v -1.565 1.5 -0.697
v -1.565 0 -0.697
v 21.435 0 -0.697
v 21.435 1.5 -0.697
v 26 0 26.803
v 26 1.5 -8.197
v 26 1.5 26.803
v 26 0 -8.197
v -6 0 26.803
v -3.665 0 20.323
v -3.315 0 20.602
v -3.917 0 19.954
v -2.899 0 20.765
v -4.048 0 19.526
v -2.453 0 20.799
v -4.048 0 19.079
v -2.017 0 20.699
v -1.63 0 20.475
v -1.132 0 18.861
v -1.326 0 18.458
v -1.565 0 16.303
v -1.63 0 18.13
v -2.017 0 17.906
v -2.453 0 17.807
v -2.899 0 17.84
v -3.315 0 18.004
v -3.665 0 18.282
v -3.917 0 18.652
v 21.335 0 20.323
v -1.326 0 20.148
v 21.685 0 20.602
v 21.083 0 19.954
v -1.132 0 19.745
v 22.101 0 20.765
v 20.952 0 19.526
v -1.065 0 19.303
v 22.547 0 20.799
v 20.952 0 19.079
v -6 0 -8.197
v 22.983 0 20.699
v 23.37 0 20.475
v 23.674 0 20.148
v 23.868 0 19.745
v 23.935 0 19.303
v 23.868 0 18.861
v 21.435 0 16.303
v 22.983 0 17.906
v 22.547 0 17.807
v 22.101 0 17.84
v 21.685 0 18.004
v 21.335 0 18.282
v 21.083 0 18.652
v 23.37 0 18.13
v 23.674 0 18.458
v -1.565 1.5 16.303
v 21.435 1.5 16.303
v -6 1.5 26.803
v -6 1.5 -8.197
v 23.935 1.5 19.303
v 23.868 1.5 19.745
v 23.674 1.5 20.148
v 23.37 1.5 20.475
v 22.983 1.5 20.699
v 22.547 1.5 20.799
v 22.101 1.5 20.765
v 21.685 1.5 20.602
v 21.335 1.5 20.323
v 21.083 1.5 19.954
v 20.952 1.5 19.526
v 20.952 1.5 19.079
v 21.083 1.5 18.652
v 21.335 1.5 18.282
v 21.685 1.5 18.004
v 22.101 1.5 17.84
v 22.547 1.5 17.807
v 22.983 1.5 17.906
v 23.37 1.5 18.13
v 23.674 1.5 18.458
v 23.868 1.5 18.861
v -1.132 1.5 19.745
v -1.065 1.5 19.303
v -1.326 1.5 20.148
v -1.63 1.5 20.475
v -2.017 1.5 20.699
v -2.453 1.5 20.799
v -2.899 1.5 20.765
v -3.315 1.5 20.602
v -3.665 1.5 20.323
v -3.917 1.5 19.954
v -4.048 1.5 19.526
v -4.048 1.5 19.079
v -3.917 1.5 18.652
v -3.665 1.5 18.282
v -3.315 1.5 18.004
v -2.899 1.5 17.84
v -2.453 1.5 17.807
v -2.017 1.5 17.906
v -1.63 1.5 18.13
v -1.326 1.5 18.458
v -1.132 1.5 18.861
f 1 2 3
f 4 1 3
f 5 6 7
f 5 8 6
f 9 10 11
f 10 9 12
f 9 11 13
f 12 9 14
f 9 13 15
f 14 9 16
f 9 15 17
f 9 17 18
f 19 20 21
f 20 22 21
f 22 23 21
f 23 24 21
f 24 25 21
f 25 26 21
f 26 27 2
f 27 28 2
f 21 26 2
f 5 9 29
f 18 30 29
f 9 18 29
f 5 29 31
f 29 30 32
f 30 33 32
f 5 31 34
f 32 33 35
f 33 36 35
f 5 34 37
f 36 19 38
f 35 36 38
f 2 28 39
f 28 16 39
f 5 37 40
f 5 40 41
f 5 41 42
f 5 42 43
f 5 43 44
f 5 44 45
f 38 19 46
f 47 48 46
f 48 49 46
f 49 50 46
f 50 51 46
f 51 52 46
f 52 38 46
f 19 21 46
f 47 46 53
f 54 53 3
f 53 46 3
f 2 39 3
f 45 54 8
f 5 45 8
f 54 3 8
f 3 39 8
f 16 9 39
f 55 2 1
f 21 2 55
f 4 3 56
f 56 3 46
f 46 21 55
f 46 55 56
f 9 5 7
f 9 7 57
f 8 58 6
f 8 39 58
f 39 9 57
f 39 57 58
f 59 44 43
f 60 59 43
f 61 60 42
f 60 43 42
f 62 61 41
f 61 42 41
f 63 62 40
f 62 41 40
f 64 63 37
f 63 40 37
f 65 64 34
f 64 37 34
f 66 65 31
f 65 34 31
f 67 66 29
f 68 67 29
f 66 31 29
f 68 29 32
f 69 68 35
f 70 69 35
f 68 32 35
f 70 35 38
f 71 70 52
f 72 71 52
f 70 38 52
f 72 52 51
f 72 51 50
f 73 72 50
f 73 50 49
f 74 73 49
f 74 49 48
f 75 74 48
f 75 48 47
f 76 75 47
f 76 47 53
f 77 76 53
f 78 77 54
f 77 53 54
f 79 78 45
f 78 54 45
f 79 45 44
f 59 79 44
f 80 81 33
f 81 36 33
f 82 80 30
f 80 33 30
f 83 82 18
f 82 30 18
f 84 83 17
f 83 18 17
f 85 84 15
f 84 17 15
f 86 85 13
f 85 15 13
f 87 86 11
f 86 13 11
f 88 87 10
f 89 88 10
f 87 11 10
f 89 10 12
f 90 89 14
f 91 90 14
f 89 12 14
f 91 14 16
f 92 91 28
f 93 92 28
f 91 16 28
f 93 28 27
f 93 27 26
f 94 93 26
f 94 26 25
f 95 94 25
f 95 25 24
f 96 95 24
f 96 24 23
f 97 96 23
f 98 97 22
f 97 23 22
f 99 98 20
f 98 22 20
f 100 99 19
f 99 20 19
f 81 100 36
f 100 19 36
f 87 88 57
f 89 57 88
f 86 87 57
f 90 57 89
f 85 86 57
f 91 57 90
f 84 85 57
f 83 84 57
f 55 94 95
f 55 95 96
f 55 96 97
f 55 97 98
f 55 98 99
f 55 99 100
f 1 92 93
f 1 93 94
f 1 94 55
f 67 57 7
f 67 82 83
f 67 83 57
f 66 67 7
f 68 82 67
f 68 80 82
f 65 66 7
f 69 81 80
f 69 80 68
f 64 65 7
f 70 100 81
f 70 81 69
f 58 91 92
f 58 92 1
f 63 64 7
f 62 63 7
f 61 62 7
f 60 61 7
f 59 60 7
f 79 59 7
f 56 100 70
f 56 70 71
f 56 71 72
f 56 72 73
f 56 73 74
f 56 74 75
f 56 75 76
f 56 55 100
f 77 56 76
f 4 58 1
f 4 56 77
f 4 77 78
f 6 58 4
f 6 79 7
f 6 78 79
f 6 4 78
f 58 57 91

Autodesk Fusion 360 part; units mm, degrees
sketch "Sketch9" plane through (0, 0, 0) normal (0, 1, 0) x (1, 0, 0)
  line L0 (-6, 8.1973) -> (26, 8.1973)
  line L1 (26, 8.1973) -> (26, -26.8027)
  line L2 (26, -26.8027) -> (-6, -26.8027)
  line L3 (-6, -26.8027) -> (-6, 8.1973)
  line L4 (10, 8.1973) -> (10, -16.3027)
  line L5 (22.4349, 8.1973) -> (22.4349, -19.3027)
  line L6 (-2.5651, 8.1973) -> (-2.5651, -19.3027)
  circle A0 centre (-2.5651, -19.3027) radius 1.5
  circle A1 centre (22.4349, -19.3027) radius 1.5
  line L7 (-2.5651, -19.3027) -> (22.4349, -19.3027)
  line L8 (10, -16.3027) -> (9.4349, -16.3027)
  line L9 (-2.5651, -16.3027) -> (22.4349, -16.3027)
  line L10 (9.9349, 0.6973) -> (-1.5651, 0.6973)
  line L11 (9.9349, 0.6973) -> (21.4349, 0.6973)
  line L12 (-1.5651, 0.6973) -> (-1.5651, -16.3027)
  line L13 (21.4349, 0.6973) -> (21.4349, -16.3027)
  dimension "d91" = 35
  dimension "d92" = 32
  dimension "d124" = 24.5
  dimension "d125" = 27.5
  dimension "d129" = 27.5
  dimension "d130" = 3
  dimension "d131" = 3
  dimension "d132" = 25
  dimension "d134" = 11.5
  dimension "d135" = 11.5
extrude "Extrude14" add sketch "Sketch9" along normal blind 1.5 contours L0 L1 L2 L3 L5 L6 A0 A1 L7 | L0 L4 L6 L9 L10 L11 L12 | L0 L4 L5 L9 L11 L13 | L5 L6 A0 A1 L7 L8 L9
